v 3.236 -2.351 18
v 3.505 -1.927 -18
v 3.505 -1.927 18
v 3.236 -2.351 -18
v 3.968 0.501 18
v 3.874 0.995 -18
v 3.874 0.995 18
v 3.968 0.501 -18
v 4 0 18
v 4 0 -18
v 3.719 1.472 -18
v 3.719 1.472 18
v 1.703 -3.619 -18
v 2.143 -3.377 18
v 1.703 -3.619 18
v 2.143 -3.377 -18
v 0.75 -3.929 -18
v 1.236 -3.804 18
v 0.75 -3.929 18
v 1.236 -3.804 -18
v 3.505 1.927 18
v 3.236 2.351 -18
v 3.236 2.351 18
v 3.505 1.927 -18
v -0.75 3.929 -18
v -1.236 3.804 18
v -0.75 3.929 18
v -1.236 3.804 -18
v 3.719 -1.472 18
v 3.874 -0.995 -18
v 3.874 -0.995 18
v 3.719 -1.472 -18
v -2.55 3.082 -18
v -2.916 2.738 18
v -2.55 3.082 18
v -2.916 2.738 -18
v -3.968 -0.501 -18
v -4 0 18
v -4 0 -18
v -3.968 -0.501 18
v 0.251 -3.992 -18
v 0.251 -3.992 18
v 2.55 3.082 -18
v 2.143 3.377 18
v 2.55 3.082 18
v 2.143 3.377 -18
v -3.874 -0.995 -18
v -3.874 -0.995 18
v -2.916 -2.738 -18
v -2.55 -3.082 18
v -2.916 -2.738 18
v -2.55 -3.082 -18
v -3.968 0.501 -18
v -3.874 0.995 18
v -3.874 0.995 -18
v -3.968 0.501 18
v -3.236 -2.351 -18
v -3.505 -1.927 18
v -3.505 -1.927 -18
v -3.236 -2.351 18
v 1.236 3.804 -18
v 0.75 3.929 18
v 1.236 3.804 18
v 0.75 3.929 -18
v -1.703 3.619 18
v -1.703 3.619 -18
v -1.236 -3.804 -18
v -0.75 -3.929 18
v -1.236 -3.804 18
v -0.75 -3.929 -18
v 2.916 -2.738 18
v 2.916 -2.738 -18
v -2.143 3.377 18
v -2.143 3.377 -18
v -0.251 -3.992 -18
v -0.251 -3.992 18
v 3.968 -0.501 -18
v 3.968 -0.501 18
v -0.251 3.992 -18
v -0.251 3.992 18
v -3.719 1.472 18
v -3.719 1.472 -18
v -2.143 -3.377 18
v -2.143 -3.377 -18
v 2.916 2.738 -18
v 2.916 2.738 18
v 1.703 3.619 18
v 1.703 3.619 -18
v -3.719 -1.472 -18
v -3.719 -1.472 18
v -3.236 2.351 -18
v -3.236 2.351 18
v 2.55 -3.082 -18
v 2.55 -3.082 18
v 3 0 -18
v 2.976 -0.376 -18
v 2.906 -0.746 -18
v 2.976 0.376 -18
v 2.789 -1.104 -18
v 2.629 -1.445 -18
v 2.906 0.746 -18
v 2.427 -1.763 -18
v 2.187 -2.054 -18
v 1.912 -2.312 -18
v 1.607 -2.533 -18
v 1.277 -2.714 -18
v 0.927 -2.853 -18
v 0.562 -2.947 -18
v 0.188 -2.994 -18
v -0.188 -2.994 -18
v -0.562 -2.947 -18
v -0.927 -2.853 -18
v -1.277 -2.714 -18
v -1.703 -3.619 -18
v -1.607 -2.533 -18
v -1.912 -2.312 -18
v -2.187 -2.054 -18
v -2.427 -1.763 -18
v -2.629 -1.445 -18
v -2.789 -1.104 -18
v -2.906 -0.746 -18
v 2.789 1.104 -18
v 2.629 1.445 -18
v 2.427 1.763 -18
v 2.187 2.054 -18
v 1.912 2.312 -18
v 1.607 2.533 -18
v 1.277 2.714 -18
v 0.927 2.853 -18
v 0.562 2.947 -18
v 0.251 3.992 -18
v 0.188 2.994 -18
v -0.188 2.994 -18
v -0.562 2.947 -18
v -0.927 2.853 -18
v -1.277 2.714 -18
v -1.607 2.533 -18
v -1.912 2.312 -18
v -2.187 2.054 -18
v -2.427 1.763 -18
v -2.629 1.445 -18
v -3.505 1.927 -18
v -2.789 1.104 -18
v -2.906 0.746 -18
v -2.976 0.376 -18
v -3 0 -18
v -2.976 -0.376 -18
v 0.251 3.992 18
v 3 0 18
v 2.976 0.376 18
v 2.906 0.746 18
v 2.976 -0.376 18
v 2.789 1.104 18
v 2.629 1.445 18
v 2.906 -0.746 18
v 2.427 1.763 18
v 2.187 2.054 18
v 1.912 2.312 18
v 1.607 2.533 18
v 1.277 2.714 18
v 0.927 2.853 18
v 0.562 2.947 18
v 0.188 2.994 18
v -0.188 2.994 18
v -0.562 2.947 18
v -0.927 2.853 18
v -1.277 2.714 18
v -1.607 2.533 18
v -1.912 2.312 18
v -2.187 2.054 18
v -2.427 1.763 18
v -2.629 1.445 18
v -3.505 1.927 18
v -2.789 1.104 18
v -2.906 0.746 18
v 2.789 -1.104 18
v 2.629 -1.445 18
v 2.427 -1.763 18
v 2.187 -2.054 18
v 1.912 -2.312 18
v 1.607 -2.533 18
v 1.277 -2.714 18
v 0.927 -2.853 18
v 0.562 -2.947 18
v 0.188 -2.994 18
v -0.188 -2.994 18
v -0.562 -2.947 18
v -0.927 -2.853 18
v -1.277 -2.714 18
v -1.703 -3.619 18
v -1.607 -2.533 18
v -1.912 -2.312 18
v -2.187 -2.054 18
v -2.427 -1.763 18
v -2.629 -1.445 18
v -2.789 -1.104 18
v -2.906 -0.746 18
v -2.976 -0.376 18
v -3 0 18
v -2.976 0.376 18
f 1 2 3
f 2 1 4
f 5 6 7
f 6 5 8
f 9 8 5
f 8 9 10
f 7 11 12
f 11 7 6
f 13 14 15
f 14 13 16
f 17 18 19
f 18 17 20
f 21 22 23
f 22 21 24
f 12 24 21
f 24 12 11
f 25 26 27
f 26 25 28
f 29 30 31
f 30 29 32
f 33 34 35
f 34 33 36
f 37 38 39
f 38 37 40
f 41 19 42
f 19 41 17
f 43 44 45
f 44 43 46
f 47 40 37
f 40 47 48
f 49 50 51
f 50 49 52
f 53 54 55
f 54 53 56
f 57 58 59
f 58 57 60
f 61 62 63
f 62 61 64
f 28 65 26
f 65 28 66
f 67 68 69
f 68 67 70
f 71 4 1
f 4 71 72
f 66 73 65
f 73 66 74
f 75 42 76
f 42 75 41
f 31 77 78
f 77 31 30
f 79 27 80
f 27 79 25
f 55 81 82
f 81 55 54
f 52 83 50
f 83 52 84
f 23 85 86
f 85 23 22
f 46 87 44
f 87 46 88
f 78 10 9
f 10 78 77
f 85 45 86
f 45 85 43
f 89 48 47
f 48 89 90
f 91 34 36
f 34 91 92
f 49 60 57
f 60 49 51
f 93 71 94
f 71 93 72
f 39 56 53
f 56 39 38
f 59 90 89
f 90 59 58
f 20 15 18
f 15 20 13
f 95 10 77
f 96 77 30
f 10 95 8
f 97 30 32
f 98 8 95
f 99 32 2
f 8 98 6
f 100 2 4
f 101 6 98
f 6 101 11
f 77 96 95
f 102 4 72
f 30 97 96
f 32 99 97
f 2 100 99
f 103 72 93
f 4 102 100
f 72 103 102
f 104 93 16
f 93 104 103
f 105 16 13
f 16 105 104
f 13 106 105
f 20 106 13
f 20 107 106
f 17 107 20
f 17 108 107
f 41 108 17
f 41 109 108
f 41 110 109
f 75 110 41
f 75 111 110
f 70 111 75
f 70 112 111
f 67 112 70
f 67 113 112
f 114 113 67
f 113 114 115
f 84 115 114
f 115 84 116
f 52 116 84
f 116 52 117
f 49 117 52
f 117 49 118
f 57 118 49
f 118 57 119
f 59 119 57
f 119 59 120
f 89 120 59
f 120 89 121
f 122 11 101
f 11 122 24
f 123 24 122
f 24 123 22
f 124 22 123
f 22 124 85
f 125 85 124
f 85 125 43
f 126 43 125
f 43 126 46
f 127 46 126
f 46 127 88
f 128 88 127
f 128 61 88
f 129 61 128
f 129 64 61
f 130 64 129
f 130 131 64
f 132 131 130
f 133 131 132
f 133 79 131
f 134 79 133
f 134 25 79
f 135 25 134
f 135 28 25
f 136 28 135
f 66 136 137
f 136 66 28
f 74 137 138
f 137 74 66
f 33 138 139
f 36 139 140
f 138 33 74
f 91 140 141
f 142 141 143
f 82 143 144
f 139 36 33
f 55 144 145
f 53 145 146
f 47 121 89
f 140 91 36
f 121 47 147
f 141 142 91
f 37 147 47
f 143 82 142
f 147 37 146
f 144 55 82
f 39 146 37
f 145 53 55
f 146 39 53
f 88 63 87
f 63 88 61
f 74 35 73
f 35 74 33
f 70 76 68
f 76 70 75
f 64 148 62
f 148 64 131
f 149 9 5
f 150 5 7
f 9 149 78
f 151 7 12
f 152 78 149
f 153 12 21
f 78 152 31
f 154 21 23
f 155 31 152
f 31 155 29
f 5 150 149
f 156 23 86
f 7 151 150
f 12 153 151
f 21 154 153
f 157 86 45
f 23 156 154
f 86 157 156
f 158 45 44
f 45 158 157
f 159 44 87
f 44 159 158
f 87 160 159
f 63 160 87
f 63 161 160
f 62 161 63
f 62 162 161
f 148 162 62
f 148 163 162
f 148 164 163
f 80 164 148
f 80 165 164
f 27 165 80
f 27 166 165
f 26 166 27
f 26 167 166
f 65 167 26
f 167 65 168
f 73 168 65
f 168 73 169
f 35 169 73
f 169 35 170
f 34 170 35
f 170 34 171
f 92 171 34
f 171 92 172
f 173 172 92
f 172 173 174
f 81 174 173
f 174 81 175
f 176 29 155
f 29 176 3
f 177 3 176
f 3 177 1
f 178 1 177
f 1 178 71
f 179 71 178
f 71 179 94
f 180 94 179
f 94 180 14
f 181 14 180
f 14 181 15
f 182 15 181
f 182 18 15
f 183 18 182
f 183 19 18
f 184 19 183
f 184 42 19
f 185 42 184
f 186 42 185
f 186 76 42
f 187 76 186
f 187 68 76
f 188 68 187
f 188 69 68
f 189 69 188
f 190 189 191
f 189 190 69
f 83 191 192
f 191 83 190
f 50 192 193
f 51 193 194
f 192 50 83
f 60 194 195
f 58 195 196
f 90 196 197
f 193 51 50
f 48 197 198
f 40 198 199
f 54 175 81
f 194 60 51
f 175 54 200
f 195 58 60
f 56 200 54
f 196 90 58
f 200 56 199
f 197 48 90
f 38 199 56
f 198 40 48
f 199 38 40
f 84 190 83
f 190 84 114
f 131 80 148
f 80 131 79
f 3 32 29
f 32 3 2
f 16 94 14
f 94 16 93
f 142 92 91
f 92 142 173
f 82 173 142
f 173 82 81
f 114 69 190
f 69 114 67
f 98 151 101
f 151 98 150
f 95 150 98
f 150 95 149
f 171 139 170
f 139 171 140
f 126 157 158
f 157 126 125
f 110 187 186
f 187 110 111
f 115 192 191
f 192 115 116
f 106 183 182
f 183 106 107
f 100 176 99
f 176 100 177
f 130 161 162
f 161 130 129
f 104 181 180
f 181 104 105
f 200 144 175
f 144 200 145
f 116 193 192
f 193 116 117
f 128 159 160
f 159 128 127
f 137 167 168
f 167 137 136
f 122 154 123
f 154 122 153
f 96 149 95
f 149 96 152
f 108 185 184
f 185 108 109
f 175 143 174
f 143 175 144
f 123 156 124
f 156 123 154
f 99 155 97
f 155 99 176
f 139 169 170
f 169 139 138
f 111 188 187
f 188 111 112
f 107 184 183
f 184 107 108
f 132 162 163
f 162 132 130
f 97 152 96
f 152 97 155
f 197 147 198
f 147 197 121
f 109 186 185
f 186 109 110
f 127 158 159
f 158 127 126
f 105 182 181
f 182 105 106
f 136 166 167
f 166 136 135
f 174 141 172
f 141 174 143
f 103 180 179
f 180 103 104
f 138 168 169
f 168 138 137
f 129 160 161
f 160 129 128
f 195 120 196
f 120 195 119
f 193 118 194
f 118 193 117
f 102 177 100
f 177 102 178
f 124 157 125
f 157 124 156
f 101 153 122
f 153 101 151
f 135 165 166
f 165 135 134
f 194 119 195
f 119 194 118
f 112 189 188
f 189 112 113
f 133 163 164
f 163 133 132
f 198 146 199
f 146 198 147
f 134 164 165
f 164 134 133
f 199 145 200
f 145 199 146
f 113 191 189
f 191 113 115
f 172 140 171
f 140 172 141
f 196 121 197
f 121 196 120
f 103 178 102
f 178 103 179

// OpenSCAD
$fn = 50;


difference() {
	union() {
		translate(v = [0, 0, -18.0000000000]) {
			cylinder(h = 36, r = 4.0000000000);
		}
	}
	union() {
		translate(v = [0, 0, -100.0000000000]) {
			cylinder(h = 200, r = 3.0000000000);
		}
	}
}
